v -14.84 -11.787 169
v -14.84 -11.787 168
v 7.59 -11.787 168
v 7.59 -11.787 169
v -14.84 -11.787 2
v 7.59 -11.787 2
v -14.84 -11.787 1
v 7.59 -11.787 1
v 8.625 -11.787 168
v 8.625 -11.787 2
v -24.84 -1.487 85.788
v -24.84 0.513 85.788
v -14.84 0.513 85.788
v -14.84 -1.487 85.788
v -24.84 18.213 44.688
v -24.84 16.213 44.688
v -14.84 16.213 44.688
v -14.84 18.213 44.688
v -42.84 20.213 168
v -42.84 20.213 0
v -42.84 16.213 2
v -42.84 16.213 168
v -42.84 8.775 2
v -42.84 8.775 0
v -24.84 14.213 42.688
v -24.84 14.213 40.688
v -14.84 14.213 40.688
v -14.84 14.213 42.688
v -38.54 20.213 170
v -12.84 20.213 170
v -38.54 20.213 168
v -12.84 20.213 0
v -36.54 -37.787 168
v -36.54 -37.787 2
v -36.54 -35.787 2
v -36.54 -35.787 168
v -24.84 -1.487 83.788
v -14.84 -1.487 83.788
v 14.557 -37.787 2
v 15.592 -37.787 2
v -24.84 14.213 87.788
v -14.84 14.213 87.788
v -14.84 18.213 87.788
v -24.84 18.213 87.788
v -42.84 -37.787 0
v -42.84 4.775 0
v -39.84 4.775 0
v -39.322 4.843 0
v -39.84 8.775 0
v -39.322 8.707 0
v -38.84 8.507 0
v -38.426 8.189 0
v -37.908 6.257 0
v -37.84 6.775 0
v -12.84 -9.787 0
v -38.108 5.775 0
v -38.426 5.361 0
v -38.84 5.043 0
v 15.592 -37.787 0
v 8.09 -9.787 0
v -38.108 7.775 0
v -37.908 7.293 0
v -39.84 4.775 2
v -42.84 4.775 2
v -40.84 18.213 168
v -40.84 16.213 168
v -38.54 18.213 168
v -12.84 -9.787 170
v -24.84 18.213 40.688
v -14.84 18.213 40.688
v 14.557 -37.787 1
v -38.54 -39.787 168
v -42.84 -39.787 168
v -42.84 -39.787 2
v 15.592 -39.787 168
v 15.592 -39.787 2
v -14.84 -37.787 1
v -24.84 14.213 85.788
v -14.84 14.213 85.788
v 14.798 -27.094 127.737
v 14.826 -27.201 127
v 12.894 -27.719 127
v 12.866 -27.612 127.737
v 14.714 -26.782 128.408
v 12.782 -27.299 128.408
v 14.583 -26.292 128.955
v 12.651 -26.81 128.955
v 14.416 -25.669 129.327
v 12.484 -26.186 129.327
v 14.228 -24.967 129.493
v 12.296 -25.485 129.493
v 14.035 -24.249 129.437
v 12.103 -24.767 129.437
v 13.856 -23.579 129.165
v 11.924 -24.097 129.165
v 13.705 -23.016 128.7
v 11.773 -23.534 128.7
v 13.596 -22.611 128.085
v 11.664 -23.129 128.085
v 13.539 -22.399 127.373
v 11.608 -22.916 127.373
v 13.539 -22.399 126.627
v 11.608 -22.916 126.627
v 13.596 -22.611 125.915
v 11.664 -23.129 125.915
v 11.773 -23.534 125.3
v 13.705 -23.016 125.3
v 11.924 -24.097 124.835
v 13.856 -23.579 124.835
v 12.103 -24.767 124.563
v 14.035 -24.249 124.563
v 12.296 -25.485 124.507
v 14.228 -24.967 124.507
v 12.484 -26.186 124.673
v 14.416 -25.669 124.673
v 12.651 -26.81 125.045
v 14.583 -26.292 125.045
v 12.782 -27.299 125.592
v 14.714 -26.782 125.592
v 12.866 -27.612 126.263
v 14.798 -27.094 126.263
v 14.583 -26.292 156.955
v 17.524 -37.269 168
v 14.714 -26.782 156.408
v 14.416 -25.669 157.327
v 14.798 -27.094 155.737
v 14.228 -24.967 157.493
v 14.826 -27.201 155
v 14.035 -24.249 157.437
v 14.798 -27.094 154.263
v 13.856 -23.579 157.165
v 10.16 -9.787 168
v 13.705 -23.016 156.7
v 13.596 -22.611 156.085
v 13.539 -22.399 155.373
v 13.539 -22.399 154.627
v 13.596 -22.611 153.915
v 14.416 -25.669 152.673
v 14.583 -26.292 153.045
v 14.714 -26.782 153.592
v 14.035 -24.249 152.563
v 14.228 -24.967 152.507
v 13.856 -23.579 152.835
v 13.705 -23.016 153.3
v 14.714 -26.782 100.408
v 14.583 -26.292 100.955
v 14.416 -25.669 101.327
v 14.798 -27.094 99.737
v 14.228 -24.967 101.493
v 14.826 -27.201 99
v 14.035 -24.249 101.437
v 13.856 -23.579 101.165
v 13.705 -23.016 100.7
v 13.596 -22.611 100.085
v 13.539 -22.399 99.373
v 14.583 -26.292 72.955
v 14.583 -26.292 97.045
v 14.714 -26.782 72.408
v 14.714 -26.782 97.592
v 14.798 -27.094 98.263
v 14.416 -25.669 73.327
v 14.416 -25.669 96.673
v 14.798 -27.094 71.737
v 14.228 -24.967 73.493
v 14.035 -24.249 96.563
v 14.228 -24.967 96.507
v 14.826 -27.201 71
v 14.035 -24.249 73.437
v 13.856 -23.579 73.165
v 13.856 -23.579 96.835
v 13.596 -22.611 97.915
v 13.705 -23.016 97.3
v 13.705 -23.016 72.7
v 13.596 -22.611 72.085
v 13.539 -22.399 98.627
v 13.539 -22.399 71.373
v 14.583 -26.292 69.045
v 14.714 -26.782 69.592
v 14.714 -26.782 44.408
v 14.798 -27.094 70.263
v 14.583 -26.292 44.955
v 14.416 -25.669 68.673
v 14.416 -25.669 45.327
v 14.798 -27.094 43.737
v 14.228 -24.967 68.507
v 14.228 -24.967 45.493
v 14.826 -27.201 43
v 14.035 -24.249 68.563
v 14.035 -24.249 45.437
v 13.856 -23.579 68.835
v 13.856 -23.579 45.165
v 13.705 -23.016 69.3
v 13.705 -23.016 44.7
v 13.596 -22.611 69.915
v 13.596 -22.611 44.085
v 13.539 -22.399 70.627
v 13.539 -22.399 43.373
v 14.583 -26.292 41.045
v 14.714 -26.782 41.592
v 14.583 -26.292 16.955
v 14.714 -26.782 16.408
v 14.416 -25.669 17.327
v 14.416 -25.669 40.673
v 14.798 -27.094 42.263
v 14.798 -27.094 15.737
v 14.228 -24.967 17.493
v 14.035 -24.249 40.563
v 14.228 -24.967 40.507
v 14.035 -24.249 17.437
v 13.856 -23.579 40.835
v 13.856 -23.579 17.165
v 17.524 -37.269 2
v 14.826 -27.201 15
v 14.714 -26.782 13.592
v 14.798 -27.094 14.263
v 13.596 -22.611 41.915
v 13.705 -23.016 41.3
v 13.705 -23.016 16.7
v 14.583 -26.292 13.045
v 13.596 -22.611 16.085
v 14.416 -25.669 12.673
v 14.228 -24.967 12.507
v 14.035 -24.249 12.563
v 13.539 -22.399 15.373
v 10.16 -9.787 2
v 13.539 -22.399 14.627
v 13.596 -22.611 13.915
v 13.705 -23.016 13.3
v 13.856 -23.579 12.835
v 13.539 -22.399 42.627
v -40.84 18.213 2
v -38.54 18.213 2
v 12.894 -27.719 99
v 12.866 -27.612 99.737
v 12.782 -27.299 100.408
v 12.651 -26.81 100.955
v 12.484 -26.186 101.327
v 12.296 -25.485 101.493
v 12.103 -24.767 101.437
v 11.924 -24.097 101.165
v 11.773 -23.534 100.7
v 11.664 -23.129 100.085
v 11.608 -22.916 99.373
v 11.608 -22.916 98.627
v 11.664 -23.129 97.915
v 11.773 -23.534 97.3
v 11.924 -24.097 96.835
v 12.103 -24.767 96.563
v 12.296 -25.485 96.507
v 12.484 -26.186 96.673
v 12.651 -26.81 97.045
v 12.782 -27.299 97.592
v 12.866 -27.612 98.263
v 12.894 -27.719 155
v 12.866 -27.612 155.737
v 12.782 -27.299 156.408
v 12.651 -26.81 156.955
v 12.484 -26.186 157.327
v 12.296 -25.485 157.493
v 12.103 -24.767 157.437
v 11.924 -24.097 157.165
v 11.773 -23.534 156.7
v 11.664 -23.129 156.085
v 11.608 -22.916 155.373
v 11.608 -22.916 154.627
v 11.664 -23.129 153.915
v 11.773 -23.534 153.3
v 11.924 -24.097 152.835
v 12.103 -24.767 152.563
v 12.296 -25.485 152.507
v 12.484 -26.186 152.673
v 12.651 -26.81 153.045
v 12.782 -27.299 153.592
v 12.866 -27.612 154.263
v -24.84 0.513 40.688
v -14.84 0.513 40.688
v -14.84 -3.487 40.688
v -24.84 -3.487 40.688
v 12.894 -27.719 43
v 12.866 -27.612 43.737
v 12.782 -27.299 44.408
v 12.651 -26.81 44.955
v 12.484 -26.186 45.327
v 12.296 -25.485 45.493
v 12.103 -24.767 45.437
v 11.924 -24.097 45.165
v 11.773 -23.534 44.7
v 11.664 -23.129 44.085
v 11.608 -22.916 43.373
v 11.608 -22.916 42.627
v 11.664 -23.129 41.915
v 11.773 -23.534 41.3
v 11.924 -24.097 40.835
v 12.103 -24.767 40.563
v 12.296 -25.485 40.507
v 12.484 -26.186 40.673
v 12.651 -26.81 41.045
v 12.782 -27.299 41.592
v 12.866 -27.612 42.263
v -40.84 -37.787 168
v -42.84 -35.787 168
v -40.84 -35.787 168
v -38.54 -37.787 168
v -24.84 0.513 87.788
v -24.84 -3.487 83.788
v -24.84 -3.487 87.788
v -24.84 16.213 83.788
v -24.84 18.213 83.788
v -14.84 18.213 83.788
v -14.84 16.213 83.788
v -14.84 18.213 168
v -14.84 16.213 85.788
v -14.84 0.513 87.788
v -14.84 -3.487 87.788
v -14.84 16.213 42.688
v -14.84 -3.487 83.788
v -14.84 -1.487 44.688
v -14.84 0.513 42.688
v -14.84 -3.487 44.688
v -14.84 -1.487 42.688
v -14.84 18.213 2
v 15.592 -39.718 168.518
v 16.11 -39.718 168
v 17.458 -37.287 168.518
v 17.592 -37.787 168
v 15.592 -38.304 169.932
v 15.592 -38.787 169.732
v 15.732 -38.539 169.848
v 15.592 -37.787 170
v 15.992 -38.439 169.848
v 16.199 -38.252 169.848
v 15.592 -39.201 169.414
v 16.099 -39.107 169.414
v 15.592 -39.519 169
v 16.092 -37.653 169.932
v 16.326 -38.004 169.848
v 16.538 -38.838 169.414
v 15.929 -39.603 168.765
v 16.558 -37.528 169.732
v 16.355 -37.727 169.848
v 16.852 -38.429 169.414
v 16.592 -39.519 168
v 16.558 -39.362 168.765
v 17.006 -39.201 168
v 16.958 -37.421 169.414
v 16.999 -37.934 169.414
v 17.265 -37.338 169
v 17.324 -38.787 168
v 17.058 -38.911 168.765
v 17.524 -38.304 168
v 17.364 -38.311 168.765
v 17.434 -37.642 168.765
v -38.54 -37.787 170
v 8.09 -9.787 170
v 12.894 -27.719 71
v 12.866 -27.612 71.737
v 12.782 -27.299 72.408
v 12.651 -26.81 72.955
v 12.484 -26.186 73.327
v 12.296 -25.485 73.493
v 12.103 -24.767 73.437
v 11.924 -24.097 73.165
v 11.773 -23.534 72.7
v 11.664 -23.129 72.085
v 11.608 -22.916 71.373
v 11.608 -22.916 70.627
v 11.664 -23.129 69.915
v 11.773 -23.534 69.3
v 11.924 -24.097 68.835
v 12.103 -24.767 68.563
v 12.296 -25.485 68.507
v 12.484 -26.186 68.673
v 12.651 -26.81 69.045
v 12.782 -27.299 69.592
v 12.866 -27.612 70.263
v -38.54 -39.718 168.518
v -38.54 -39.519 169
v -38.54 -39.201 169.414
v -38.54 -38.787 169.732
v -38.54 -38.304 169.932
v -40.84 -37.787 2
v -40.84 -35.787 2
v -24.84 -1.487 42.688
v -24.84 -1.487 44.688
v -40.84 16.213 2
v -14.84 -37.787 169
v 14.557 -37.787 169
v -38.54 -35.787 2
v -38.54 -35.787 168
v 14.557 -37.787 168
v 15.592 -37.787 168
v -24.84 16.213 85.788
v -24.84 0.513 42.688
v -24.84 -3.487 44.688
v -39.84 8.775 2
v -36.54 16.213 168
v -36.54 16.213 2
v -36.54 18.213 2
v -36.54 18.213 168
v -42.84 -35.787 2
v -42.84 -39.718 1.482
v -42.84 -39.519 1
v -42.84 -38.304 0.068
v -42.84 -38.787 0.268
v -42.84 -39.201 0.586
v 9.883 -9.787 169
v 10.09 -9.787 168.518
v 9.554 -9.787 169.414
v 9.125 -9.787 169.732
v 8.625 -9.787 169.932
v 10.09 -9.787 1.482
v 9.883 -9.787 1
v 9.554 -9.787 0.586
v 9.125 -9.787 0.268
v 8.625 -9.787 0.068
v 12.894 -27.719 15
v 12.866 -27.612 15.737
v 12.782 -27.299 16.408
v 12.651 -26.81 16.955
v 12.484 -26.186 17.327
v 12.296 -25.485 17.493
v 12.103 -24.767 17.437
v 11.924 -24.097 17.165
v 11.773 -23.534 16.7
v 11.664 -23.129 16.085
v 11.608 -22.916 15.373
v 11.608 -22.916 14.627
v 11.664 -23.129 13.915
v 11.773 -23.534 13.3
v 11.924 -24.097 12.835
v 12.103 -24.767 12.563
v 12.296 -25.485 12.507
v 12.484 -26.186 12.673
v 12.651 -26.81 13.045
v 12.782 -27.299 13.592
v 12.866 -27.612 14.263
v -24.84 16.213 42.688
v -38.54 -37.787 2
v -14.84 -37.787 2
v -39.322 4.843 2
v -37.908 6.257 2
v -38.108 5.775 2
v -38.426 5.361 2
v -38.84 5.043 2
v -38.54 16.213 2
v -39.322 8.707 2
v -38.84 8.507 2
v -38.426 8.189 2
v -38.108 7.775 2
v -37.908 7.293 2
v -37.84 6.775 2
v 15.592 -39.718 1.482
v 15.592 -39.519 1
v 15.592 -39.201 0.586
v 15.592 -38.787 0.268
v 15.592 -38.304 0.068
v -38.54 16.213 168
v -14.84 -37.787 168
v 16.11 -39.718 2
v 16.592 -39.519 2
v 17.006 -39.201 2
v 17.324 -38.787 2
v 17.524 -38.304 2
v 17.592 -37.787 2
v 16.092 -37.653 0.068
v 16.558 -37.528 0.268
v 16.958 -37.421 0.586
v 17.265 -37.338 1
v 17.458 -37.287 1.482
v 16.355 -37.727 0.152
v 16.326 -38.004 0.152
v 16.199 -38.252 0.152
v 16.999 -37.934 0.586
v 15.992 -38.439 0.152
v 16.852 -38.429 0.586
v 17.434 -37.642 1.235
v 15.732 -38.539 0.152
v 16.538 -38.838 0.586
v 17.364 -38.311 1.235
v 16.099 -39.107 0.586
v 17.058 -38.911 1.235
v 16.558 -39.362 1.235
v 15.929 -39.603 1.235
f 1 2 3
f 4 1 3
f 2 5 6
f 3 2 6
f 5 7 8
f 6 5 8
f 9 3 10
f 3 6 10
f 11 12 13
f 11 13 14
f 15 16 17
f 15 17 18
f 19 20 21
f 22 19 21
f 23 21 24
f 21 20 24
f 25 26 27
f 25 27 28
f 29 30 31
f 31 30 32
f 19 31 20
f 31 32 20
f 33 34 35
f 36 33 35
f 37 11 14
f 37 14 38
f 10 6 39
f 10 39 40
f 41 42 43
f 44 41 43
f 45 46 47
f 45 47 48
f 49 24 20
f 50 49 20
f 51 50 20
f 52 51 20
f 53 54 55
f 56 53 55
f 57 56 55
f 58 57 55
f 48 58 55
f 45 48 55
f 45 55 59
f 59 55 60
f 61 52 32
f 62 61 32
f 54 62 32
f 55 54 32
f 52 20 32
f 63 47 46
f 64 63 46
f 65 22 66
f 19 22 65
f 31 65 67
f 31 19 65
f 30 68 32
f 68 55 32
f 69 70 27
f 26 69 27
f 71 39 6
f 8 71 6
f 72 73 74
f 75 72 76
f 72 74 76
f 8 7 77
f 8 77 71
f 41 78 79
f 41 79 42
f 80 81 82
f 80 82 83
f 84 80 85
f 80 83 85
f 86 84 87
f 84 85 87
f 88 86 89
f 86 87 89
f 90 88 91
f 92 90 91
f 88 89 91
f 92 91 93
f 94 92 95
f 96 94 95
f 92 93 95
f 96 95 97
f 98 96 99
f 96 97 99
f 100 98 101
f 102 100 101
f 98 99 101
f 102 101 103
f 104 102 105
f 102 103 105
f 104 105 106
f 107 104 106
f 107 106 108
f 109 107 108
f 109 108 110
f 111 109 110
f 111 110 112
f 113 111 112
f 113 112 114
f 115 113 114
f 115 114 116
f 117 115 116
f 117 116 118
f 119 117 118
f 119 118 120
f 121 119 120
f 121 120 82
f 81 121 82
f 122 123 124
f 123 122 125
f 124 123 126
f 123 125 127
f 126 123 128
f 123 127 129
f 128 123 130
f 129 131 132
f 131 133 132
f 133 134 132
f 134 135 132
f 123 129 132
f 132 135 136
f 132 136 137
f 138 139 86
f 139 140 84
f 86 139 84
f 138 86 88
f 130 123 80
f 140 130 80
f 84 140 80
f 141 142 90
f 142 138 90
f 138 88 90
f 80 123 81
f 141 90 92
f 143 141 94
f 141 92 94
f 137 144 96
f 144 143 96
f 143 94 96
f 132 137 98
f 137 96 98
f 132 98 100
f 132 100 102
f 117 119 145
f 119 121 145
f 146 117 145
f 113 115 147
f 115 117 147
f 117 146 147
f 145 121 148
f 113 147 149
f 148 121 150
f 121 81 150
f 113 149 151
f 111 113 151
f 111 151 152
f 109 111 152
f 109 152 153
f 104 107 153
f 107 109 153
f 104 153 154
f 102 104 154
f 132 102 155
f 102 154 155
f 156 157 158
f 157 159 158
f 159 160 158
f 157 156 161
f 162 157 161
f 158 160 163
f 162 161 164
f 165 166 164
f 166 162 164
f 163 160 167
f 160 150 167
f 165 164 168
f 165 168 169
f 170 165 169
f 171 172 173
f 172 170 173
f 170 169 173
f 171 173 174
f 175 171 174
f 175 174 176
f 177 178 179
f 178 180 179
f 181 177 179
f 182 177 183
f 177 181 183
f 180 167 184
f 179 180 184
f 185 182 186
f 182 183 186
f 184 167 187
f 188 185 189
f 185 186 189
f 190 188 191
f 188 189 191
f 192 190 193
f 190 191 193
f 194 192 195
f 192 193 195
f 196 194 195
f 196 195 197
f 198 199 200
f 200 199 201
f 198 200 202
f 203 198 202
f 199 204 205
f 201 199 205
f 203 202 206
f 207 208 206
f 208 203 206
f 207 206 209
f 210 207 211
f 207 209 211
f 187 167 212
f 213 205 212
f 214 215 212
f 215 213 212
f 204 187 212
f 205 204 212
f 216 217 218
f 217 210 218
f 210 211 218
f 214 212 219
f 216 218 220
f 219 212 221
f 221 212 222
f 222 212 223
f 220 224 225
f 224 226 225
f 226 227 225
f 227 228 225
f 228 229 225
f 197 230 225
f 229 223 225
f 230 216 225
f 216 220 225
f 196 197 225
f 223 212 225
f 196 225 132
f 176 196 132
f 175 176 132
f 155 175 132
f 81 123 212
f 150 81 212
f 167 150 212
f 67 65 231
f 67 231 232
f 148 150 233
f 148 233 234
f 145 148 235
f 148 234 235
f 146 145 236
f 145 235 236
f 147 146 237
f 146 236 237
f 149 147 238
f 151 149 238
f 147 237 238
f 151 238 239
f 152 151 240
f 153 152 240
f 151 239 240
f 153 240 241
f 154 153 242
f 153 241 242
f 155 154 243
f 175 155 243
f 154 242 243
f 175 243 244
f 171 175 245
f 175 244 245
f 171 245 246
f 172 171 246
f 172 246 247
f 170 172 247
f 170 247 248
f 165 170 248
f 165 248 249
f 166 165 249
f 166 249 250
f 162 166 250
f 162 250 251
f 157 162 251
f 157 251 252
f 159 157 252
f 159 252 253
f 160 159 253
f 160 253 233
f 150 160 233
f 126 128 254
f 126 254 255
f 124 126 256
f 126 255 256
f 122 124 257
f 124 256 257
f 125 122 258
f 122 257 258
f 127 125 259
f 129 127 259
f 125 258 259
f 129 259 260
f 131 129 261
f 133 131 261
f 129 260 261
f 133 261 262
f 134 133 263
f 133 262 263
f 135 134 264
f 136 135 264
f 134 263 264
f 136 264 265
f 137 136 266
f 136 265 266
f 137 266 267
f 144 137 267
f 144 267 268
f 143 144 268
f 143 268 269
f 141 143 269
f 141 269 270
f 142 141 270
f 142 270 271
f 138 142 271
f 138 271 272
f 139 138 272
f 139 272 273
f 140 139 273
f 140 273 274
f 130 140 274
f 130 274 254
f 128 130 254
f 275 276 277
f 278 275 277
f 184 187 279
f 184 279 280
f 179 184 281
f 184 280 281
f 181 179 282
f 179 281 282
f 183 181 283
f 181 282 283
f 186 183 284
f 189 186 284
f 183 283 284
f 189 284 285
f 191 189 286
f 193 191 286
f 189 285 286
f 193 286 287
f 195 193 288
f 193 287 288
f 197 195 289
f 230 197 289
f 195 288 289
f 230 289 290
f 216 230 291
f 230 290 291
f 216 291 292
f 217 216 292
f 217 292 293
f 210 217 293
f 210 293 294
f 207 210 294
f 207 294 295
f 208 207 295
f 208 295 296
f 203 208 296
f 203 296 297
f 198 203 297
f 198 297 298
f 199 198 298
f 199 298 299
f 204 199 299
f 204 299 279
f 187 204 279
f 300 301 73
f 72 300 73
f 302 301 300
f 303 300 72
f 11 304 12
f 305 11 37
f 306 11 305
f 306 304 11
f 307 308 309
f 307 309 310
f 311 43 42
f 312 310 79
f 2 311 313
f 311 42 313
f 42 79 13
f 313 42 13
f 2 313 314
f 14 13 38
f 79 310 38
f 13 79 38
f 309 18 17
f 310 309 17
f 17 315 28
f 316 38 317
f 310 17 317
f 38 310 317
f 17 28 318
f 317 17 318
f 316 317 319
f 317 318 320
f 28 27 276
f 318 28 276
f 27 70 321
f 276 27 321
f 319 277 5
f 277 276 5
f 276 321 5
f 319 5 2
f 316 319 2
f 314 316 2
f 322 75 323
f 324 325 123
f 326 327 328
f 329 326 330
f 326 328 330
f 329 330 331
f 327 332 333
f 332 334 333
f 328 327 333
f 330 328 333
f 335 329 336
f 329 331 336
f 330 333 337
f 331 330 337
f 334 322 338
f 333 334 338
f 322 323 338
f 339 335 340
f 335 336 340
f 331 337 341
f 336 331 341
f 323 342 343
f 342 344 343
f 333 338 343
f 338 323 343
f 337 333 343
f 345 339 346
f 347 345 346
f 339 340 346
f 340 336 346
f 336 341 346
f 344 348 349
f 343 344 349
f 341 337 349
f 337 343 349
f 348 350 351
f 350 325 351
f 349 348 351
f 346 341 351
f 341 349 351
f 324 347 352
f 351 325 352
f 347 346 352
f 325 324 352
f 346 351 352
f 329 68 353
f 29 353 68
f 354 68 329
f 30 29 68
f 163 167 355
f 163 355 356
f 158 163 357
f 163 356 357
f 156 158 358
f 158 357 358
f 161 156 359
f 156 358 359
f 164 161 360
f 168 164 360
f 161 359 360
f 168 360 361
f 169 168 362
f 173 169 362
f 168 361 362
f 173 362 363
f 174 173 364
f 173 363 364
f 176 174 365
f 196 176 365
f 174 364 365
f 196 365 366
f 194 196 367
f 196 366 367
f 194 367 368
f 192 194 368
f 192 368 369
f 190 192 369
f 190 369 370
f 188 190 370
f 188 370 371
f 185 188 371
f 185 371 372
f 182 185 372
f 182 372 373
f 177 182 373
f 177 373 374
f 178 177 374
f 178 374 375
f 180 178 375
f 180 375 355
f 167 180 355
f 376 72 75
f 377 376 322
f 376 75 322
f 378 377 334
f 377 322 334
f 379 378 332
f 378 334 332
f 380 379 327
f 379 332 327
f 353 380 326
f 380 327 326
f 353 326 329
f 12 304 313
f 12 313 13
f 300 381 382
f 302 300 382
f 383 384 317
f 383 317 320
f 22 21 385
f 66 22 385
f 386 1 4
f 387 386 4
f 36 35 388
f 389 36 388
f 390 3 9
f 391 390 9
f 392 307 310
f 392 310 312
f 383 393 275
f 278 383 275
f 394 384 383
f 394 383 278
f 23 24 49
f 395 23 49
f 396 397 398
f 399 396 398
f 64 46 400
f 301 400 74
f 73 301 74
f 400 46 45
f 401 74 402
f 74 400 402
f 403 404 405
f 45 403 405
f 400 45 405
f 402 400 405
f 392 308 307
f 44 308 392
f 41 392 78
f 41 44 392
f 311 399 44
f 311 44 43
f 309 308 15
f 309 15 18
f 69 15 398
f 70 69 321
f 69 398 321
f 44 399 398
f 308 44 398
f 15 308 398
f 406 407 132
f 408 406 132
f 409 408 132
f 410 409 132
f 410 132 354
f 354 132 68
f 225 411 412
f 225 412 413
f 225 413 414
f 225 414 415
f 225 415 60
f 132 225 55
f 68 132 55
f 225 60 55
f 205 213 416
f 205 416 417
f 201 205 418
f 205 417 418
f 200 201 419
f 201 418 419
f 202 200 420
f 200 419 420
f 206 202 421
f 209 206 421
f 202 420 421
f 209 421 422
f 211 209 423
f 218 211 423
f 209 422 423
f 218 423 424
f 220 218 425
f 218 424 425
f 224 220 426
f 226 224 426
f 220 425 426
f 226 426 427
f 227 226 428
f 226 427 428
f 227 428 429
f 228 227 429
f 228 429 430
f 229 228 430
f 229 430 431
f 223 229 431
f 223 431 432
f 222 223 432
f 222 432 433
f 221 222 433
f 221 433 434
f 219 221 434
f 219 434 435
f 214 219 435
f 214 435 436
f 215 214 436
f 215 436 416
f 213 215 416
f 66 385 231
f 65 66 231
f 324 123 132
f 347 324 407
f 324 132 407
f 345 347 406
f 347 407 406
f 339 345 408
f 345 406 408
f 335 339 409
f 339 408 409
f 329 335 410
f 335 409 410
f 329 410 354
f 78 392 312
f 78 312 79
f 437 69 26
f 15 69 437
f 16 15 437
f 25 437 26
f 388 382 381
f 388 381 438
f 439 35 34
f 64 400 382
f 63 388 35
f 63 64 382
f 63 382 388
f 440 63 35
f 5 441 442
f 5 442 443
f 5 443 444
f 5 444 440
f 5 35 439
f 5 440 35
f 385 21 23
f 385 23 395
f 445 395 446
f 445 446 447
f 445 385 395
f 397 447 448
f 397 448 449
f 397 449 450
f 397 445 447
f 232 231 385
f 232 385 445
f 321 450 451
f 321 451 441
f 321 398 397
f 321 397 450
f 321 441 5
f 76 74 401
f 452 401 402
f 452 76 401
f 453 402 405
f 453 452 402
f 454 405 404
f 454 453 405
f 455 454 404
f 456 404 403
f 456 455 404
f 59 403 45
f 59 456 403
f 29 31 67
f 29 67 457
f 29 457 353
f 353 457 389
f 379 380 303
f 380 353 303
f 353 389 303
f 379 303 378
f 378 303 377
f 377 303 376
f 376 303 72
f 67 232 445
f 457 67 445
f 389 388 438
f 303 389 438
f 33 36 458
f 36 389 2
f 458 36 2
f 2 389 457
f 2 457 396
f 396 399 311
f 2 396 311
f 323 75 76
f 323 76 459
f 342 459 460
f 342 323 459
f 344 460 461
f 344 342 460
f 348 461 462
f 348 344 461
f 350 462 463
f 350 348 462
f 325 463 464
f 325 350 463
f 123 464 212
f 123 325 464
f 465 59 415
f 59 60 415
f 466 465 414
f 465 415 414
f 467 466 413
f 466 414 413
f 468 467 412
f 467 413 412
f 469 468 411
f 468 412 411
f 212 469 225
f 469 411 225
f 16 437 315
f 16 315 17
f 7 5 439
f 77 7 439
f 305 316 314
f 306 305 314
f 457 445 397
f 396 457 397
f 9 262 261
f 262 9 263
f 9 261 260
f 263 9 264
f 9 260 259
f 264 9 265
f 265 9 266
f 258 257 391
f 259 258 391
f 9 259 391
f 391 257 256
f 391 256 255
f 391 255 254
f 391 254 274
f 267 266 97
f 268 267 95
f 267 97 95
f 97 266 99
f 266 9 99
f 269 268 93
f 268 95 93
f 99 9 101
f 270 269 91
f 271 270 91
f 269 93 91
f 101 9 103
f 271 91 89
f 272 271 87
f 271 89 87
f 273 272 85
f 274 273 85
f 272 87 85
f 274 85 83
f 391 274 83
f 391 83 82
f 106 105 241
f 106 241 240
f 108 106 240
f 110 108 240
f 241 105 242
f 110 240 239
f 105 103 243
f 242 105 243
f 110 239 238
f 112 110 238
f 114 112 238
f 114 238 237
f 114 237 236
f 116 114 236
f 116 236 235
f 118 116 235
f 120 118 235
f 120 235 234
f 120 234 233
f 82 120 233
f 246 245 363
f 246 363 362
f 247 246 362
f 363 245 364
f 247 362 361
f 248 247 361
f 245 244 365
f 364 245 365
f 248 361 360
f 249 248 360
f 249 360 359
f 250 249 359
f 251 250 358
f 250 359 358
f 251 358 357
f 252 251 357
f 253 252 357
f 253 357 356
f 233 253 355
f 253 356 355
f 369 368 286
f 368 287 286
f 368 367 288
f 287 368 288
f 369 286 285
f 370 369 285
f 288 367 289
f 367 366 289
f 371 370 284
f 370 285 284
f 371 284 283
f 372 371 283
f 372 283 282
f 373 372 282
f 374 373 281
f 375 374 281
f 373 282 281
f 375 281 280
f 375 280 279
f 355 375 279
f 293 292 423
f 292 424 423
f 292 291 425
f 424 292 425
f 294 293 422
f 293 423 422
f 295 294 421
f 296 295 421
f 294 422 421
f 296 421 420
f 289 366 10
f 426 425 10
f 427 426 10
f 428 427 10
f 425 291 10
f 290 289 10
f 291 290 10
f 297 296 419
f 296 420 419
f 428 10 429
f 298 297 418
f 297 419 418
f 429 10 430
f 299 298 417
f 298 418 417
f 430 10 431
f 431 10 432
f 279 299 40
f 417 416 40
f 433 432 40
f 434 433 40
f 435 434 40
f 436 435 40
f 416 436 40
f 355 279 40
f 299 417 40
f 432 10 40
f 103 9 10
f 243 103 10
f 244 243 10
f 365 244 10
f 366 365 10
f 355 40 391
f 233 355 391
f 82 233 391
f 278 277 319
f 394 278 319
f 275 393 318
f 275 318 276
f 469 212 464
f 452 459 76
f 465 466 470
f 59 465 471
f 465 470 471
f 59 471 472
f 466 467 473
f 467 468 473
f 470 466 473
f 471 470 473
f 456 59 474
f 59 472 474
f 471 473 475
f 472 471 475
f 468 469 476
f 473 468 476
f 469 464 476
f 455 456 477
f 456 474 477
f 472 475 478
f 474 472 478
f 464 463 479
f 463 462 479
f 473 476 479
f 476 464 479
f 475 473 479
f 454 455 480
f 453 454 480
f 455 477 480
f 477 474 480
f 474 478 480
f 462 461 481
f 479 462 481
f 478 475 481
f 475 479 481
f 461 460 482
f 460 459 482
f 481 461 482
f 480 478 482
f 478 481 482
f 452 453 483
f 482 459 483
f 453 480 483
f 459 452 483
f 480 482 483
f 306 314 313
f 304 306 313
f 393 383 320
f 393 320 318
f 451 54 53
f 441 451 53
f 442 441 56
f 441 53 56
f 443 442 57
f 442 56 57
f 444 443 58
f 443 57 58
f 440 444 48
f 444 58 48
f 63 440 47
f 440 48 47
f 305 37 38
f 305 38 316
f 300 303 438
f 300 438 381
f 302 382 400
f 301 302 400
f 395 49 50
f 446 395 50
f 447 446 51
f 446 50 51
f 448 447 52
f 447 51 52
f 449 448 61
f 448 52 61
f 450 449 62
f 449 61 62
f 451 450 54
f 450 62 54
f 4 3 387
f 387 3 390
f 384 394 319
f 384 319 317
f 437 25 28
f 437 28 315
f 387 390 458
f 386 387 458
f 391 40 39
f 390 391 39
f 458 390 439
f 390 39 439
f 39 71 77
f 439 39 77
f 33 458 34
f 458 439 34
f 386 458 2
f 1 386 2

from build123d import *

# Parameters (mm, degrees)
F1_DEPTH  = 2
F3_DEPTH  = 166
F5_D      = 5
F5_DEPTH  = 10
F7_DEPTH  = 2
F8_R      = 2
F10_DEPTH = 25
F12_DEPTH = 10
F14_DEPTH = 1
F16_DEPTH = 1


with BuildPart() as f1:
    # F0 (on Top) → F1 (new body)
    with BuildSketch(Plane.XY):
        Polygon((-42.839942, -39.786562), (18.198534, -39.786562), (10.160058, -9.786562), (-12.839942, -9.786562), (-12.839942, 20.213438), (-42.839942, 20.213438), (-42.839942, -9.786562), align=None)
    extrude(amount=F1_DEPTH)

    # F2 (on face) → F3 (join)
    with BuildSketch(Plane.XY.offset(2)):
        Polygon((-36.539942, 16.213438), (-36.539942, 18.213438), (-14.839942, 18.213438), (-14.839942, -11.786562), (8.625404, -11.786562), (15.592083, -37.786562), (-36.539942, -37.786562), (-36.539942, -35.786562), (-38.539942, -35.786562), (-38.539942, -37.786562), (-40.839942, -37.786562), (-40.839942, -35.786562), (-42.839942, -35.786562), (-42.839942, -39.786562), (18.198534, -39.786562), (10.160058, -9.786562), (-12.839942, -9.786562), (-12.839942, 20.213438), (-42.839942, 20.213438), (-42.839942, 16.213438), (-40.839942, 16.213438), (-40.839942, 18.213438), (-38.539942, 18.213438), (-38.539942, 16.213438), align=None)
    extrude(amount=F3_DEPTH)

    # F5
    with Locations(Plane(origin=(7.032822, 1.884439, 0), x_dir=(-0.258819, 0.965926, 0), z_dir=(0.965926, 0.258819, 0))):
        with Locations((-27.611852, 155), (-27.611852, 127), (-27.611852, 99), (-27.611852, 71), (-27.611852, 43), (-27.611852, 15)):
            Hole(F5_D / 2, depth=F5_DEPTH)

    # F6 (on face) → F7 (join)
    with BuildSketch(Plane.XY.offset(168)):
        Polygon((-38.539942, -39.786562), (18.198534, -39.786562), (10.160058, -9.786562), (-12.839942, -9.786562), (-12.839942, 20.213438), (-38.539942, 20.213438), (-38.539942, -37.786562), align=None)
    extrude(amount=F7_DEPTH)

    # F8
    f8_edges = [f1.edges().sort_by_distance(p)[0] for p in [
        (-12.320704, -39.786562, 0),
        (18.198534, -39.786562, 85),
        (14.179296, -24.786562, 0),
        (-10.170704, -39.786562, 170),
        (14.179296, -24.786562, 170),
    ]]
    fillet(f8_edges, radius=F8_R)

    # F9 (on face) → F10 (cut)
    with BuildSketch(Plane(origin=(0, 0, 0), x_dir=(1, 0, 0), z_dir=(0, 0, -1))):
        with BuildLine():
            ThreePointArc((-39.839942, -8.775018), (-38.425729, -8.189231), (-37.839942, -6.775018))
            ThreePointArc((-37.839942, -6.775018), (-38.425729, -5.360804), (-39.839942, -4.775018))
            ThreePointArc((-39.839942, -4.775018), (-41.839942, -6.775018), (-39.839942, -8.775018))
        make_face()
        with BuildLine():
            ThreePointArc((-39.839942, -8.775018), (-41.839942, -6.775018), (-39.839942, -4.775018))
            Line((-39.839942, -4.775018), (-42.839942, -4.775018))
            Line((-42.839942, -4.775018), (-42.839942, -8.775018))
            Line((-42.839942, -8.775018), (-39.839942, -8.775018))
        make_face()
    extrude(amount=-F10_DEPTH, mode=Mode.SUBTRACT)

    # F11 (on face) → F12 (join)
    with BuildSketch(Plane(origin=(-14.839942, 0, 0), x_dir=(0, -1, 0), z_dir=(-1, 0, 0))):
        Polygon((3.486562, 44.687904), (1.486562, 44.687904), (1.486562, 42.687904), (-0.513438, 42.687904), (-0.513438, 40.687904), (3.486562, 40.687904), align=None)
        Polygon((-16.213438, 42.687904), (-16.213438, 44.687904), (-18.213438, 44.687904), (-18.213438, 40.687904), (-14.213438, 40.687904), (-14.213438, 42.687904), align=None)
        Polygon((-16.213438, 83.787904), (-16.213438, 85.787904), (-14.213438, 85.787904), (-14.213438, 87.787904), (-18.213438, 87.787904), (-18.213438, 83.787904), align=None)
        Polygon((-0.513438, 87.787904), (-0.513438, 85.787904), (1.486562, 85.787904), (1.486562, 83.787904), (3.486562, 83.787904), (3.486562, 87.787904), align=None)
    extrude(amount=F12_DEPTH)

    # F13 (on face) → F14 (cut)
    with BuildSketch(Plane.XY.offset(2)):
        Polygon((14.556807, -37.786562), (7.590128, -11.786562), (-14.839942, -11.786562), (-14.839942, -37.786562), align=None)
    extrude(amount=-F14_DEPTH, mode=Mode.SUBTRACT)

    # F15 (on face) → F16 (cut)
    with BuildSketch(Plane(origin=(0, 0, 168), x_dir=(1, 0, 0), z_dir=(0, 0, -1))):
        Polygon((-14.839942, 11.786562), (7.590128, 11.786562), (14.556807, 37.786562), (-14.839942, 37.786562), align=None)
    extrude(amount=-F16_DEPTH, mode=Mode.SUBTRACT)


solid = f1.part
